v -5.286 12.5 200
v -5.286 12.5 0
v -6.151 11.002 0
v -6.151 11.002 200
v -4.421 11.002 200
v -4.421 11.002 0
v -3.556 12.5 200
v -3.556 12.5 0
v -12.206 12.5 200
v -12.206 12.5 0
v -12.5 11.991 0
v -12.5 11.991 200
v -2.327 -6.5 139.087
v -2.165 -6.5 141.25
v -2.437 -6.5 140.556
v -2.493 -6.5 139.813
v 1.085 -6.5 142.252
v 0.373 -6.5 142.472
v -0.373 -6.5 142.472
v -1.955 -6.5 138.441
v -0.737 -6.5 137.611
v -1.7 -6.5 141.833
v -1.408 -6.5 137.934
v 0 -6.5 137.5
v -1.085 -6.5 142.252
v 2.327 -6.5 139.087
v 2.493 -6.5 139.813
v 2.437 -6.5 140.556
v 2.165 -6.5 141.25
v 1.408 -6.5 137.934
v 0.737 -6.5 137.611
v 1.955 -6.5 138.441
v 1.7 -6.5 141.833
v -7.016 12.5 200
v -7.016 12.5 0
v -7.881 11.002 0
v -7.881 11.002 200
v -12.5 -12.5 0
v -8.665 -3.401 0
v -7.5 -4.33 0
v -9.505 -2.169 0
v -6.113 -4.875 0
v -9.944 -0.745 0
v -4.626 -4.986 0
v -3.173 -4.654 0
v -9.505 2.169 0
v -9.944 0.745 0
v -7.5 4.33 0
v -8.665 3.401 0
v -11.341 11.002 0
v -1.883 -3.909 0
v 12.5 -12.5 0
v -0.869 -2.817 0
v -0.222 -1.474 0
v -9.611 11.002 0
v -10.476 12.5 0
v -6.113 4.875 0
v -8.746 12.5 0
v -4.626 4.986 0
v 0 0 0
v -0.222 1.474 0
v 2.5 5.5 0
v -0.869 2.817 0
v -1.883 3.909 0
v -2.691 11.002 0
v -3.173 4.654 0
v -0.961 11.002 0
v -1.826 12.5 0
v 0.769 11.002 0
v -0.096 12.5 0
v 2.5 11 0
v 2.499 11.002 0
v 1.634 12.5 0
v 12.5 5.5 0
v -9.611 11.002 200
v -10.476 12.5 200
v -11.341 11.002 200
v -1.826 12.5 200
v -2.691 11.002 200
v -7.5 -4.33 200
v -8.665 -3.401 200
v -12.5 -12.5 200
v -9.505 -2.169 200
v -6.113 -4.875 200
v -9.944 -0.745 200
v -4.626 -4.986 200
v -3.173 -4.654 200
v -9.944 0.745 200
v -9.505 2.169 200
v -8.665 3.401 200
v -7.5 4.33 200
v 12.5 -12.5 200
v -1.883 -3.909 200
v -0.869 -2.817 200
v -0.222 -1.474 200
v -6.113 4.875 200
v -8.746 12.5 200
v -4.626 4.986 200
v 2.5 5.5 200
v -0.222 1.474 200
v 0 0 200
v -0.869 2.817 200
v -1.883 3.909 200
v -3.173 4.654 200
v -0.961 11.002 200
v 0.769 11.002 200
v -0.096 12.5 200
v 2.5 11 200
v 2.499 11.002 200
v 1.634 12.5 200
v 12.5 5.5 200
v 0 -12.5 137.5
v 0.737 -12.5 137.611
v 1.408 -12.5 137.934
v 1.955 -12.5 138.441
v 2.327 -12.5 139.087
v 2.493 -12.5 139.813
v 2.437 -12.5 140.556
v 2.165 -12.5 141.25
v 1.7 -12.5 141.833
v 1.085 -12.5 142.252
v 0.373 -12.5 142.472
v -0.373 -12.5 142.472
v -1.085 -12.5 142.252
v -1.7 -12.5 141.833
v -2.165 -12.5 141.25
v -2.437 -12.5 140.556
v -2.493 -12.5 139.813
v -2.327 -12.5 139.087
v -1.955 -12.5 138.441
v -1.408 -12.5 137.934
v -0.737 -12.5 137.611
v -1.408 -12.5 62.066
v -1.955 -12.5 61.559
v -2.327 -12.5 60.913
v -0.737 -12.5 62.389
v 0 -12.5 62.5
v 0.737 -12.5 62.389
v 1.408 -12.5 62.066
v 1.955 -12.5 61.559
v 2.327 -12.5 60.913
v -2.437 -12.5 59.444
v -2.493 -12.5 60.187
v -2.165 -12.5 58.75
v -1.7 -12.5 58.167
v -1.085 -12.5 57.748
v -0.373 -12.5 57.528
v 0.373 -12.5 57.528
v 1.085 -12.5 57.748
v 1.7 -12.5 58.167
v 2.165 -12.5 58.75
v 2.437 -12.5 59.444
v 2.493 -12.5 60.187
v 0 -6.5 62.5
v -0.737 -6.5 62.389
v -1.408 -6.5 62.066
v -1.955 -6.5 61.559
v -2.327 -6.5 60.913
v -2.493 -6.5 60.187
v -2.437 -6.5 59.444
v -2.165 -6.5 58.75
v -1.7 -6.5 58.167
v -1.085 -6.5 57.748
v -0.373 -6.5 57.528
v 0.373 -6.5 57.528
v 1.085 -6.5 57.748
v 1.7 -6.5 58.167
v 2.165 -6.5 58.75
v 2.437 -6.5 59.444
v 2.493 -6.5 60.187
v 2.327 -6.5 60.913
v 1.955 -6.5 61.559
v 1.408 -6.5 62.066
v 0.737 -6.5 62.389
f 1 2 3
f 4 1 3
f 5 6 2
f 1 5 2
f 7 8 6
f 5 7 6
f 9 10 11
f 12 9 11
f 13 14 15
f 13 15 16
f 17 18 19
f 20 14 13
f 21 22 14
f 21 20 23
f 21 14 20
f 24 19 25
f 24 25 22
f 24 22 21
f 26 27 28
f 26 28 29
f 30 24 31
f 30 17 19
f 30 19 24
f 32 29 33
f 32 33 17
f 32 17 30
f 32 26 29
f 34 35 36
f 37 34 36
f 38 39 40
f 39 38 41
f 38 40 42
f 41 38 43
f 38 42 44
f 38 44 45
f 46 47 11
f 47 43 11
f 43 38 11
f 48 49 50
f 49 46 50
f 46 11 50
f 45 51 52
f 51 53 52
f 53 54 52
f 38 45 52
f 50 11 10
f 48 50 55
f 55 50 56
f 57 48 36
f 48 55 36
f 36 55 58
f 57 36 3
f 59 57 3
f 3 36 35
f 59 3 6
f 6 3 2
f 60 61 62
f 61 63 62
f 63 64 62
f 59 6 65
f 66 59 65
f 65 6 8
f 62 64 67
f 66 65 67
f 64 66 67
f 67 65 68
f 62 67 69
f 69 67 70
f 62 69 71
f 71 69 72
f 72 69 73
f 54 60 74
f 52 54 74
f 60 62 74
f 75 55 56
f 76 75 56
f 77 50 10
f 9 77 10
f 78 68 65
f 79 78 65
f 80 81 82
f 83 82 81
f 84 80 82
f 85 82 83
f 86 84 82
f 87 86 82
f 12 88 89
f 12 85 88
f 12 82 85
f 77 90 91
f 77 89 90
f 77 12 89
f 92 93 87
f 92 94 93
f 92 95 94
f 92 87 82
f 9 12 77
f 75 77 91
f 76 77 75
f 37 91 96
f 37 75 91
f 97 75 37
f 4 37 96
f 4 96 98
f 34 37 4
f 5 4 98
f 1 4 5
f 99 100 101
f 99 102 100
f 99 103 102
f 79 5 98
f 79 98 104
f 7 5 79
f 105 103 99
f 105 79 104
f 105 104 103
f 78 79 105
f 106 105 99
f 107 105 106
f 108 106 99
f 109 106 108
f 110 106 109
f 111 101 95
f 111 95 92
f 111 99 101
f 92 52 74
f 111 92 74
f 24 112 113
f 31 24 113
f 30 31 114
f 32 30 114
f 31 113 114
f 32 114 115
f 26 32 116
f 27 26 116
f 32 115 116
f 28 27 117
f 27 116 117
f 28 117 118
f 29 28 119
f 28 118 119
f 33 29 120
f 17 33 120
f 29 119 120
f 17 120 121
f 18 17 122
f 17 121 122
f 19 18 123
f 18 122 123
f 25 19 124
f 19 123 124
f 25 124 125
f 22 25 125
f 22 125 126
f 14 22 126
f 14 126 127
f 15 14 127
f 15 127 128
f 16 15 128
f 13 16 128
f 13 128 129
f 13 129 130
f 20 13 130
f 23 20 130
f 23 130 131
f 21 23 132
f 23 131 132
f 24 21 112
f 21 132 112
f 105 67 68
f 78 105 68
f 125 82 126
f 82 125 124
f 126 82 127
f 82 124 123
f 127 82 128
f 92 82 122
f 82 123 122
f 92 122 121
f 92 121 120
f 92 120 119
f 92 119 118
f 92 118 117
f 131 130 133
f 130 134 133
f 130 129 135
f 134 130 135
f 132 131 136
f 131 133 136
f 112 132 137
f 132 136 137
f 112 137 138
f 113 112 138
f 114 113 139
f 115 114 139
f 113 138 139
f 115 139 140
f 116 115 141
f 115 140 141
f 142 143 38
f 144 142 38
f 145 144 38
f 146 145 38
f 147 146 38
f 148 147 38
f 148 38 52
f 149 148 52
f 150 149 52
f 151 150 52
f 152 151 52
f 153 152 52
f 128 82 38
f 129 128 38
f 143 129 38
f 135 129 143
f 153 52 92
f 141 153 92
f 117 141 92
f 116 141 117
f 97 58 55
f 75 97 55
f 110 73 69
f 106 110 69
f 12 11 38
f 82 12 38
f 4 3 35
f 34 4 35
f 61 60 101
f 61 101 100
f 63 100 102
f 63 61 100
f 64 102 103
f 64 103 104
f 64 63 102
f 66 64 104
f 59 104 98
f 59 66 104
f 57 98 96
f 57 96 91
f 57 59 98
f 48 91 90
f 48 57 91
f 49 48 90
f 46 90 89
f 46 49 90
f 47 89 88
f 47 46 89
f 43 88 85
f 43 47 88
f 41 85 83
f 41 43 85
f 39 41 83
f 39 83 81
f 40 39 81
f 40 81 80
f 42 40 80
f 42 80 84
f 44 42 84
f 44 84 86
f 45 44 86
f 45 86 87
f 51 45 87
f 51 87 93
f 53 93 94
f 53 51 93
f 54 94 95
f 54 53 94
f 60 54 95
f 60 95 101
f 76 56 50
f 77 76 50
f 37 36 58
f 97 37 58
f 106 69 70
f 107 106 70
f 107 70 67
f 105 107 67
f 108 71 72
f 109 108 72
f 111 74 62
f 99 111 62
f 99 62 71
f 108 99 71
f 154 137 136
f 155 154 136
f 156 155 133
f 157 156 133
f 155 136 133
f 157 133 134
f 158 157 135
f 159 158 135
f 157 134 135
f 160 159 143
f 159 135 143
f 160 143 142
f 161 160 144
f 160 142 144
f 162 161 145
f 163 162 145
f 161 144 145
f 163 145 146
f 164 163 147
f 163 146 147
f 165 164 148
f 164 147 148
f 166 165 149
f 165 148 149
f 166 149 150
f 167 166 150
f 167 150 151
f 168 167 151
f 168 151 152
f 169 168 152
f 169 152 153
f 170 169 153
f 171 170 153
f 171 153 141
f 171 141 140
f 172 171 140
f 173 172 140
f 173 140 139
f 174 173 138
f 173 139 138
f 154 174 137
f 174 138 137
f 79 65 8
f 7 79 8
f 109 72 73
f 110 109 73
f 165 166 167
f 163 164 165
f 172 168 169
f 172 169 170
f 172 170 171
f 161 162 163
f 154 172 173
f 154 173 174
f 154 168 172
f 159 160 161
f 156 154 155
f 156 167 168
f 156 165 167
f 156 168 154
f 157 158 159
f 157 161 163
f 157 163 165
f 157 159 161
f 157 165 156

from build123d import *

# Parameters (mm, degrees)
SKETCH1_R           = 5
BOSS_EXTRUDE1_DEPTH = 200
SKETCH2_R           = 2.5
CUT_EXTRUDE1_DEPTH  = 6


with BuildPart() as part:
    # Sketch1 → Boss-Extrude1 (new body)
    with BuildSketch(Plane.XY):
        Polygon((-12.5, 11.990821063), (-12.5, -12.5), (12.5, -12.5), (12.5, 5.5), (2.5, 5.5), (2.5, 11), (2.498974596, 11.001776051), (1.633974596, 12.5), (0.768974596, 11.001776051), (-0.096025404, 12.5), (-0.961025404, 11.001776051), (-1.826025404, 12.5), (-2.691025404, 11.001776051), (-3.556025404, 12.5), (-4.421025404, 11.001776051), (-5.286025404, 12.5), (-6.151025404, 11.001776051), (-7.016025404, 12.5), (-7.881025404, 11.001776051), (-8.746025404, 12.5), (-9.611025404, 11.001776051), (-10.476025404, 12.5), (-11.341025404, 11.001776051), (-12.206025404, 12.5), align=None)
        with Locations((-5, 0)):
            Circle(SKETCH1_R, mode=Mode.SUBTRACT)
    extrude(amount=BOSS_EXTRUDE1_DEPTH)

    # Sketch2 → Cut-Extrude1 (cut)
    with BuildSketch(Plane.XZ.offset(12.5)):
        with Locations(Location((0, 140, 0), (0, 0, 270))):
            Circle(SKETCH2_R)
        with Locations(Location((0, 60, 0), (0, 0, 90))):
            Circle(SKETCH2_R)
    extrude(amount=-CUT_EXTRUDE1_DEPTH, mode=Mode.SUBTRACT)


solid = part.part
